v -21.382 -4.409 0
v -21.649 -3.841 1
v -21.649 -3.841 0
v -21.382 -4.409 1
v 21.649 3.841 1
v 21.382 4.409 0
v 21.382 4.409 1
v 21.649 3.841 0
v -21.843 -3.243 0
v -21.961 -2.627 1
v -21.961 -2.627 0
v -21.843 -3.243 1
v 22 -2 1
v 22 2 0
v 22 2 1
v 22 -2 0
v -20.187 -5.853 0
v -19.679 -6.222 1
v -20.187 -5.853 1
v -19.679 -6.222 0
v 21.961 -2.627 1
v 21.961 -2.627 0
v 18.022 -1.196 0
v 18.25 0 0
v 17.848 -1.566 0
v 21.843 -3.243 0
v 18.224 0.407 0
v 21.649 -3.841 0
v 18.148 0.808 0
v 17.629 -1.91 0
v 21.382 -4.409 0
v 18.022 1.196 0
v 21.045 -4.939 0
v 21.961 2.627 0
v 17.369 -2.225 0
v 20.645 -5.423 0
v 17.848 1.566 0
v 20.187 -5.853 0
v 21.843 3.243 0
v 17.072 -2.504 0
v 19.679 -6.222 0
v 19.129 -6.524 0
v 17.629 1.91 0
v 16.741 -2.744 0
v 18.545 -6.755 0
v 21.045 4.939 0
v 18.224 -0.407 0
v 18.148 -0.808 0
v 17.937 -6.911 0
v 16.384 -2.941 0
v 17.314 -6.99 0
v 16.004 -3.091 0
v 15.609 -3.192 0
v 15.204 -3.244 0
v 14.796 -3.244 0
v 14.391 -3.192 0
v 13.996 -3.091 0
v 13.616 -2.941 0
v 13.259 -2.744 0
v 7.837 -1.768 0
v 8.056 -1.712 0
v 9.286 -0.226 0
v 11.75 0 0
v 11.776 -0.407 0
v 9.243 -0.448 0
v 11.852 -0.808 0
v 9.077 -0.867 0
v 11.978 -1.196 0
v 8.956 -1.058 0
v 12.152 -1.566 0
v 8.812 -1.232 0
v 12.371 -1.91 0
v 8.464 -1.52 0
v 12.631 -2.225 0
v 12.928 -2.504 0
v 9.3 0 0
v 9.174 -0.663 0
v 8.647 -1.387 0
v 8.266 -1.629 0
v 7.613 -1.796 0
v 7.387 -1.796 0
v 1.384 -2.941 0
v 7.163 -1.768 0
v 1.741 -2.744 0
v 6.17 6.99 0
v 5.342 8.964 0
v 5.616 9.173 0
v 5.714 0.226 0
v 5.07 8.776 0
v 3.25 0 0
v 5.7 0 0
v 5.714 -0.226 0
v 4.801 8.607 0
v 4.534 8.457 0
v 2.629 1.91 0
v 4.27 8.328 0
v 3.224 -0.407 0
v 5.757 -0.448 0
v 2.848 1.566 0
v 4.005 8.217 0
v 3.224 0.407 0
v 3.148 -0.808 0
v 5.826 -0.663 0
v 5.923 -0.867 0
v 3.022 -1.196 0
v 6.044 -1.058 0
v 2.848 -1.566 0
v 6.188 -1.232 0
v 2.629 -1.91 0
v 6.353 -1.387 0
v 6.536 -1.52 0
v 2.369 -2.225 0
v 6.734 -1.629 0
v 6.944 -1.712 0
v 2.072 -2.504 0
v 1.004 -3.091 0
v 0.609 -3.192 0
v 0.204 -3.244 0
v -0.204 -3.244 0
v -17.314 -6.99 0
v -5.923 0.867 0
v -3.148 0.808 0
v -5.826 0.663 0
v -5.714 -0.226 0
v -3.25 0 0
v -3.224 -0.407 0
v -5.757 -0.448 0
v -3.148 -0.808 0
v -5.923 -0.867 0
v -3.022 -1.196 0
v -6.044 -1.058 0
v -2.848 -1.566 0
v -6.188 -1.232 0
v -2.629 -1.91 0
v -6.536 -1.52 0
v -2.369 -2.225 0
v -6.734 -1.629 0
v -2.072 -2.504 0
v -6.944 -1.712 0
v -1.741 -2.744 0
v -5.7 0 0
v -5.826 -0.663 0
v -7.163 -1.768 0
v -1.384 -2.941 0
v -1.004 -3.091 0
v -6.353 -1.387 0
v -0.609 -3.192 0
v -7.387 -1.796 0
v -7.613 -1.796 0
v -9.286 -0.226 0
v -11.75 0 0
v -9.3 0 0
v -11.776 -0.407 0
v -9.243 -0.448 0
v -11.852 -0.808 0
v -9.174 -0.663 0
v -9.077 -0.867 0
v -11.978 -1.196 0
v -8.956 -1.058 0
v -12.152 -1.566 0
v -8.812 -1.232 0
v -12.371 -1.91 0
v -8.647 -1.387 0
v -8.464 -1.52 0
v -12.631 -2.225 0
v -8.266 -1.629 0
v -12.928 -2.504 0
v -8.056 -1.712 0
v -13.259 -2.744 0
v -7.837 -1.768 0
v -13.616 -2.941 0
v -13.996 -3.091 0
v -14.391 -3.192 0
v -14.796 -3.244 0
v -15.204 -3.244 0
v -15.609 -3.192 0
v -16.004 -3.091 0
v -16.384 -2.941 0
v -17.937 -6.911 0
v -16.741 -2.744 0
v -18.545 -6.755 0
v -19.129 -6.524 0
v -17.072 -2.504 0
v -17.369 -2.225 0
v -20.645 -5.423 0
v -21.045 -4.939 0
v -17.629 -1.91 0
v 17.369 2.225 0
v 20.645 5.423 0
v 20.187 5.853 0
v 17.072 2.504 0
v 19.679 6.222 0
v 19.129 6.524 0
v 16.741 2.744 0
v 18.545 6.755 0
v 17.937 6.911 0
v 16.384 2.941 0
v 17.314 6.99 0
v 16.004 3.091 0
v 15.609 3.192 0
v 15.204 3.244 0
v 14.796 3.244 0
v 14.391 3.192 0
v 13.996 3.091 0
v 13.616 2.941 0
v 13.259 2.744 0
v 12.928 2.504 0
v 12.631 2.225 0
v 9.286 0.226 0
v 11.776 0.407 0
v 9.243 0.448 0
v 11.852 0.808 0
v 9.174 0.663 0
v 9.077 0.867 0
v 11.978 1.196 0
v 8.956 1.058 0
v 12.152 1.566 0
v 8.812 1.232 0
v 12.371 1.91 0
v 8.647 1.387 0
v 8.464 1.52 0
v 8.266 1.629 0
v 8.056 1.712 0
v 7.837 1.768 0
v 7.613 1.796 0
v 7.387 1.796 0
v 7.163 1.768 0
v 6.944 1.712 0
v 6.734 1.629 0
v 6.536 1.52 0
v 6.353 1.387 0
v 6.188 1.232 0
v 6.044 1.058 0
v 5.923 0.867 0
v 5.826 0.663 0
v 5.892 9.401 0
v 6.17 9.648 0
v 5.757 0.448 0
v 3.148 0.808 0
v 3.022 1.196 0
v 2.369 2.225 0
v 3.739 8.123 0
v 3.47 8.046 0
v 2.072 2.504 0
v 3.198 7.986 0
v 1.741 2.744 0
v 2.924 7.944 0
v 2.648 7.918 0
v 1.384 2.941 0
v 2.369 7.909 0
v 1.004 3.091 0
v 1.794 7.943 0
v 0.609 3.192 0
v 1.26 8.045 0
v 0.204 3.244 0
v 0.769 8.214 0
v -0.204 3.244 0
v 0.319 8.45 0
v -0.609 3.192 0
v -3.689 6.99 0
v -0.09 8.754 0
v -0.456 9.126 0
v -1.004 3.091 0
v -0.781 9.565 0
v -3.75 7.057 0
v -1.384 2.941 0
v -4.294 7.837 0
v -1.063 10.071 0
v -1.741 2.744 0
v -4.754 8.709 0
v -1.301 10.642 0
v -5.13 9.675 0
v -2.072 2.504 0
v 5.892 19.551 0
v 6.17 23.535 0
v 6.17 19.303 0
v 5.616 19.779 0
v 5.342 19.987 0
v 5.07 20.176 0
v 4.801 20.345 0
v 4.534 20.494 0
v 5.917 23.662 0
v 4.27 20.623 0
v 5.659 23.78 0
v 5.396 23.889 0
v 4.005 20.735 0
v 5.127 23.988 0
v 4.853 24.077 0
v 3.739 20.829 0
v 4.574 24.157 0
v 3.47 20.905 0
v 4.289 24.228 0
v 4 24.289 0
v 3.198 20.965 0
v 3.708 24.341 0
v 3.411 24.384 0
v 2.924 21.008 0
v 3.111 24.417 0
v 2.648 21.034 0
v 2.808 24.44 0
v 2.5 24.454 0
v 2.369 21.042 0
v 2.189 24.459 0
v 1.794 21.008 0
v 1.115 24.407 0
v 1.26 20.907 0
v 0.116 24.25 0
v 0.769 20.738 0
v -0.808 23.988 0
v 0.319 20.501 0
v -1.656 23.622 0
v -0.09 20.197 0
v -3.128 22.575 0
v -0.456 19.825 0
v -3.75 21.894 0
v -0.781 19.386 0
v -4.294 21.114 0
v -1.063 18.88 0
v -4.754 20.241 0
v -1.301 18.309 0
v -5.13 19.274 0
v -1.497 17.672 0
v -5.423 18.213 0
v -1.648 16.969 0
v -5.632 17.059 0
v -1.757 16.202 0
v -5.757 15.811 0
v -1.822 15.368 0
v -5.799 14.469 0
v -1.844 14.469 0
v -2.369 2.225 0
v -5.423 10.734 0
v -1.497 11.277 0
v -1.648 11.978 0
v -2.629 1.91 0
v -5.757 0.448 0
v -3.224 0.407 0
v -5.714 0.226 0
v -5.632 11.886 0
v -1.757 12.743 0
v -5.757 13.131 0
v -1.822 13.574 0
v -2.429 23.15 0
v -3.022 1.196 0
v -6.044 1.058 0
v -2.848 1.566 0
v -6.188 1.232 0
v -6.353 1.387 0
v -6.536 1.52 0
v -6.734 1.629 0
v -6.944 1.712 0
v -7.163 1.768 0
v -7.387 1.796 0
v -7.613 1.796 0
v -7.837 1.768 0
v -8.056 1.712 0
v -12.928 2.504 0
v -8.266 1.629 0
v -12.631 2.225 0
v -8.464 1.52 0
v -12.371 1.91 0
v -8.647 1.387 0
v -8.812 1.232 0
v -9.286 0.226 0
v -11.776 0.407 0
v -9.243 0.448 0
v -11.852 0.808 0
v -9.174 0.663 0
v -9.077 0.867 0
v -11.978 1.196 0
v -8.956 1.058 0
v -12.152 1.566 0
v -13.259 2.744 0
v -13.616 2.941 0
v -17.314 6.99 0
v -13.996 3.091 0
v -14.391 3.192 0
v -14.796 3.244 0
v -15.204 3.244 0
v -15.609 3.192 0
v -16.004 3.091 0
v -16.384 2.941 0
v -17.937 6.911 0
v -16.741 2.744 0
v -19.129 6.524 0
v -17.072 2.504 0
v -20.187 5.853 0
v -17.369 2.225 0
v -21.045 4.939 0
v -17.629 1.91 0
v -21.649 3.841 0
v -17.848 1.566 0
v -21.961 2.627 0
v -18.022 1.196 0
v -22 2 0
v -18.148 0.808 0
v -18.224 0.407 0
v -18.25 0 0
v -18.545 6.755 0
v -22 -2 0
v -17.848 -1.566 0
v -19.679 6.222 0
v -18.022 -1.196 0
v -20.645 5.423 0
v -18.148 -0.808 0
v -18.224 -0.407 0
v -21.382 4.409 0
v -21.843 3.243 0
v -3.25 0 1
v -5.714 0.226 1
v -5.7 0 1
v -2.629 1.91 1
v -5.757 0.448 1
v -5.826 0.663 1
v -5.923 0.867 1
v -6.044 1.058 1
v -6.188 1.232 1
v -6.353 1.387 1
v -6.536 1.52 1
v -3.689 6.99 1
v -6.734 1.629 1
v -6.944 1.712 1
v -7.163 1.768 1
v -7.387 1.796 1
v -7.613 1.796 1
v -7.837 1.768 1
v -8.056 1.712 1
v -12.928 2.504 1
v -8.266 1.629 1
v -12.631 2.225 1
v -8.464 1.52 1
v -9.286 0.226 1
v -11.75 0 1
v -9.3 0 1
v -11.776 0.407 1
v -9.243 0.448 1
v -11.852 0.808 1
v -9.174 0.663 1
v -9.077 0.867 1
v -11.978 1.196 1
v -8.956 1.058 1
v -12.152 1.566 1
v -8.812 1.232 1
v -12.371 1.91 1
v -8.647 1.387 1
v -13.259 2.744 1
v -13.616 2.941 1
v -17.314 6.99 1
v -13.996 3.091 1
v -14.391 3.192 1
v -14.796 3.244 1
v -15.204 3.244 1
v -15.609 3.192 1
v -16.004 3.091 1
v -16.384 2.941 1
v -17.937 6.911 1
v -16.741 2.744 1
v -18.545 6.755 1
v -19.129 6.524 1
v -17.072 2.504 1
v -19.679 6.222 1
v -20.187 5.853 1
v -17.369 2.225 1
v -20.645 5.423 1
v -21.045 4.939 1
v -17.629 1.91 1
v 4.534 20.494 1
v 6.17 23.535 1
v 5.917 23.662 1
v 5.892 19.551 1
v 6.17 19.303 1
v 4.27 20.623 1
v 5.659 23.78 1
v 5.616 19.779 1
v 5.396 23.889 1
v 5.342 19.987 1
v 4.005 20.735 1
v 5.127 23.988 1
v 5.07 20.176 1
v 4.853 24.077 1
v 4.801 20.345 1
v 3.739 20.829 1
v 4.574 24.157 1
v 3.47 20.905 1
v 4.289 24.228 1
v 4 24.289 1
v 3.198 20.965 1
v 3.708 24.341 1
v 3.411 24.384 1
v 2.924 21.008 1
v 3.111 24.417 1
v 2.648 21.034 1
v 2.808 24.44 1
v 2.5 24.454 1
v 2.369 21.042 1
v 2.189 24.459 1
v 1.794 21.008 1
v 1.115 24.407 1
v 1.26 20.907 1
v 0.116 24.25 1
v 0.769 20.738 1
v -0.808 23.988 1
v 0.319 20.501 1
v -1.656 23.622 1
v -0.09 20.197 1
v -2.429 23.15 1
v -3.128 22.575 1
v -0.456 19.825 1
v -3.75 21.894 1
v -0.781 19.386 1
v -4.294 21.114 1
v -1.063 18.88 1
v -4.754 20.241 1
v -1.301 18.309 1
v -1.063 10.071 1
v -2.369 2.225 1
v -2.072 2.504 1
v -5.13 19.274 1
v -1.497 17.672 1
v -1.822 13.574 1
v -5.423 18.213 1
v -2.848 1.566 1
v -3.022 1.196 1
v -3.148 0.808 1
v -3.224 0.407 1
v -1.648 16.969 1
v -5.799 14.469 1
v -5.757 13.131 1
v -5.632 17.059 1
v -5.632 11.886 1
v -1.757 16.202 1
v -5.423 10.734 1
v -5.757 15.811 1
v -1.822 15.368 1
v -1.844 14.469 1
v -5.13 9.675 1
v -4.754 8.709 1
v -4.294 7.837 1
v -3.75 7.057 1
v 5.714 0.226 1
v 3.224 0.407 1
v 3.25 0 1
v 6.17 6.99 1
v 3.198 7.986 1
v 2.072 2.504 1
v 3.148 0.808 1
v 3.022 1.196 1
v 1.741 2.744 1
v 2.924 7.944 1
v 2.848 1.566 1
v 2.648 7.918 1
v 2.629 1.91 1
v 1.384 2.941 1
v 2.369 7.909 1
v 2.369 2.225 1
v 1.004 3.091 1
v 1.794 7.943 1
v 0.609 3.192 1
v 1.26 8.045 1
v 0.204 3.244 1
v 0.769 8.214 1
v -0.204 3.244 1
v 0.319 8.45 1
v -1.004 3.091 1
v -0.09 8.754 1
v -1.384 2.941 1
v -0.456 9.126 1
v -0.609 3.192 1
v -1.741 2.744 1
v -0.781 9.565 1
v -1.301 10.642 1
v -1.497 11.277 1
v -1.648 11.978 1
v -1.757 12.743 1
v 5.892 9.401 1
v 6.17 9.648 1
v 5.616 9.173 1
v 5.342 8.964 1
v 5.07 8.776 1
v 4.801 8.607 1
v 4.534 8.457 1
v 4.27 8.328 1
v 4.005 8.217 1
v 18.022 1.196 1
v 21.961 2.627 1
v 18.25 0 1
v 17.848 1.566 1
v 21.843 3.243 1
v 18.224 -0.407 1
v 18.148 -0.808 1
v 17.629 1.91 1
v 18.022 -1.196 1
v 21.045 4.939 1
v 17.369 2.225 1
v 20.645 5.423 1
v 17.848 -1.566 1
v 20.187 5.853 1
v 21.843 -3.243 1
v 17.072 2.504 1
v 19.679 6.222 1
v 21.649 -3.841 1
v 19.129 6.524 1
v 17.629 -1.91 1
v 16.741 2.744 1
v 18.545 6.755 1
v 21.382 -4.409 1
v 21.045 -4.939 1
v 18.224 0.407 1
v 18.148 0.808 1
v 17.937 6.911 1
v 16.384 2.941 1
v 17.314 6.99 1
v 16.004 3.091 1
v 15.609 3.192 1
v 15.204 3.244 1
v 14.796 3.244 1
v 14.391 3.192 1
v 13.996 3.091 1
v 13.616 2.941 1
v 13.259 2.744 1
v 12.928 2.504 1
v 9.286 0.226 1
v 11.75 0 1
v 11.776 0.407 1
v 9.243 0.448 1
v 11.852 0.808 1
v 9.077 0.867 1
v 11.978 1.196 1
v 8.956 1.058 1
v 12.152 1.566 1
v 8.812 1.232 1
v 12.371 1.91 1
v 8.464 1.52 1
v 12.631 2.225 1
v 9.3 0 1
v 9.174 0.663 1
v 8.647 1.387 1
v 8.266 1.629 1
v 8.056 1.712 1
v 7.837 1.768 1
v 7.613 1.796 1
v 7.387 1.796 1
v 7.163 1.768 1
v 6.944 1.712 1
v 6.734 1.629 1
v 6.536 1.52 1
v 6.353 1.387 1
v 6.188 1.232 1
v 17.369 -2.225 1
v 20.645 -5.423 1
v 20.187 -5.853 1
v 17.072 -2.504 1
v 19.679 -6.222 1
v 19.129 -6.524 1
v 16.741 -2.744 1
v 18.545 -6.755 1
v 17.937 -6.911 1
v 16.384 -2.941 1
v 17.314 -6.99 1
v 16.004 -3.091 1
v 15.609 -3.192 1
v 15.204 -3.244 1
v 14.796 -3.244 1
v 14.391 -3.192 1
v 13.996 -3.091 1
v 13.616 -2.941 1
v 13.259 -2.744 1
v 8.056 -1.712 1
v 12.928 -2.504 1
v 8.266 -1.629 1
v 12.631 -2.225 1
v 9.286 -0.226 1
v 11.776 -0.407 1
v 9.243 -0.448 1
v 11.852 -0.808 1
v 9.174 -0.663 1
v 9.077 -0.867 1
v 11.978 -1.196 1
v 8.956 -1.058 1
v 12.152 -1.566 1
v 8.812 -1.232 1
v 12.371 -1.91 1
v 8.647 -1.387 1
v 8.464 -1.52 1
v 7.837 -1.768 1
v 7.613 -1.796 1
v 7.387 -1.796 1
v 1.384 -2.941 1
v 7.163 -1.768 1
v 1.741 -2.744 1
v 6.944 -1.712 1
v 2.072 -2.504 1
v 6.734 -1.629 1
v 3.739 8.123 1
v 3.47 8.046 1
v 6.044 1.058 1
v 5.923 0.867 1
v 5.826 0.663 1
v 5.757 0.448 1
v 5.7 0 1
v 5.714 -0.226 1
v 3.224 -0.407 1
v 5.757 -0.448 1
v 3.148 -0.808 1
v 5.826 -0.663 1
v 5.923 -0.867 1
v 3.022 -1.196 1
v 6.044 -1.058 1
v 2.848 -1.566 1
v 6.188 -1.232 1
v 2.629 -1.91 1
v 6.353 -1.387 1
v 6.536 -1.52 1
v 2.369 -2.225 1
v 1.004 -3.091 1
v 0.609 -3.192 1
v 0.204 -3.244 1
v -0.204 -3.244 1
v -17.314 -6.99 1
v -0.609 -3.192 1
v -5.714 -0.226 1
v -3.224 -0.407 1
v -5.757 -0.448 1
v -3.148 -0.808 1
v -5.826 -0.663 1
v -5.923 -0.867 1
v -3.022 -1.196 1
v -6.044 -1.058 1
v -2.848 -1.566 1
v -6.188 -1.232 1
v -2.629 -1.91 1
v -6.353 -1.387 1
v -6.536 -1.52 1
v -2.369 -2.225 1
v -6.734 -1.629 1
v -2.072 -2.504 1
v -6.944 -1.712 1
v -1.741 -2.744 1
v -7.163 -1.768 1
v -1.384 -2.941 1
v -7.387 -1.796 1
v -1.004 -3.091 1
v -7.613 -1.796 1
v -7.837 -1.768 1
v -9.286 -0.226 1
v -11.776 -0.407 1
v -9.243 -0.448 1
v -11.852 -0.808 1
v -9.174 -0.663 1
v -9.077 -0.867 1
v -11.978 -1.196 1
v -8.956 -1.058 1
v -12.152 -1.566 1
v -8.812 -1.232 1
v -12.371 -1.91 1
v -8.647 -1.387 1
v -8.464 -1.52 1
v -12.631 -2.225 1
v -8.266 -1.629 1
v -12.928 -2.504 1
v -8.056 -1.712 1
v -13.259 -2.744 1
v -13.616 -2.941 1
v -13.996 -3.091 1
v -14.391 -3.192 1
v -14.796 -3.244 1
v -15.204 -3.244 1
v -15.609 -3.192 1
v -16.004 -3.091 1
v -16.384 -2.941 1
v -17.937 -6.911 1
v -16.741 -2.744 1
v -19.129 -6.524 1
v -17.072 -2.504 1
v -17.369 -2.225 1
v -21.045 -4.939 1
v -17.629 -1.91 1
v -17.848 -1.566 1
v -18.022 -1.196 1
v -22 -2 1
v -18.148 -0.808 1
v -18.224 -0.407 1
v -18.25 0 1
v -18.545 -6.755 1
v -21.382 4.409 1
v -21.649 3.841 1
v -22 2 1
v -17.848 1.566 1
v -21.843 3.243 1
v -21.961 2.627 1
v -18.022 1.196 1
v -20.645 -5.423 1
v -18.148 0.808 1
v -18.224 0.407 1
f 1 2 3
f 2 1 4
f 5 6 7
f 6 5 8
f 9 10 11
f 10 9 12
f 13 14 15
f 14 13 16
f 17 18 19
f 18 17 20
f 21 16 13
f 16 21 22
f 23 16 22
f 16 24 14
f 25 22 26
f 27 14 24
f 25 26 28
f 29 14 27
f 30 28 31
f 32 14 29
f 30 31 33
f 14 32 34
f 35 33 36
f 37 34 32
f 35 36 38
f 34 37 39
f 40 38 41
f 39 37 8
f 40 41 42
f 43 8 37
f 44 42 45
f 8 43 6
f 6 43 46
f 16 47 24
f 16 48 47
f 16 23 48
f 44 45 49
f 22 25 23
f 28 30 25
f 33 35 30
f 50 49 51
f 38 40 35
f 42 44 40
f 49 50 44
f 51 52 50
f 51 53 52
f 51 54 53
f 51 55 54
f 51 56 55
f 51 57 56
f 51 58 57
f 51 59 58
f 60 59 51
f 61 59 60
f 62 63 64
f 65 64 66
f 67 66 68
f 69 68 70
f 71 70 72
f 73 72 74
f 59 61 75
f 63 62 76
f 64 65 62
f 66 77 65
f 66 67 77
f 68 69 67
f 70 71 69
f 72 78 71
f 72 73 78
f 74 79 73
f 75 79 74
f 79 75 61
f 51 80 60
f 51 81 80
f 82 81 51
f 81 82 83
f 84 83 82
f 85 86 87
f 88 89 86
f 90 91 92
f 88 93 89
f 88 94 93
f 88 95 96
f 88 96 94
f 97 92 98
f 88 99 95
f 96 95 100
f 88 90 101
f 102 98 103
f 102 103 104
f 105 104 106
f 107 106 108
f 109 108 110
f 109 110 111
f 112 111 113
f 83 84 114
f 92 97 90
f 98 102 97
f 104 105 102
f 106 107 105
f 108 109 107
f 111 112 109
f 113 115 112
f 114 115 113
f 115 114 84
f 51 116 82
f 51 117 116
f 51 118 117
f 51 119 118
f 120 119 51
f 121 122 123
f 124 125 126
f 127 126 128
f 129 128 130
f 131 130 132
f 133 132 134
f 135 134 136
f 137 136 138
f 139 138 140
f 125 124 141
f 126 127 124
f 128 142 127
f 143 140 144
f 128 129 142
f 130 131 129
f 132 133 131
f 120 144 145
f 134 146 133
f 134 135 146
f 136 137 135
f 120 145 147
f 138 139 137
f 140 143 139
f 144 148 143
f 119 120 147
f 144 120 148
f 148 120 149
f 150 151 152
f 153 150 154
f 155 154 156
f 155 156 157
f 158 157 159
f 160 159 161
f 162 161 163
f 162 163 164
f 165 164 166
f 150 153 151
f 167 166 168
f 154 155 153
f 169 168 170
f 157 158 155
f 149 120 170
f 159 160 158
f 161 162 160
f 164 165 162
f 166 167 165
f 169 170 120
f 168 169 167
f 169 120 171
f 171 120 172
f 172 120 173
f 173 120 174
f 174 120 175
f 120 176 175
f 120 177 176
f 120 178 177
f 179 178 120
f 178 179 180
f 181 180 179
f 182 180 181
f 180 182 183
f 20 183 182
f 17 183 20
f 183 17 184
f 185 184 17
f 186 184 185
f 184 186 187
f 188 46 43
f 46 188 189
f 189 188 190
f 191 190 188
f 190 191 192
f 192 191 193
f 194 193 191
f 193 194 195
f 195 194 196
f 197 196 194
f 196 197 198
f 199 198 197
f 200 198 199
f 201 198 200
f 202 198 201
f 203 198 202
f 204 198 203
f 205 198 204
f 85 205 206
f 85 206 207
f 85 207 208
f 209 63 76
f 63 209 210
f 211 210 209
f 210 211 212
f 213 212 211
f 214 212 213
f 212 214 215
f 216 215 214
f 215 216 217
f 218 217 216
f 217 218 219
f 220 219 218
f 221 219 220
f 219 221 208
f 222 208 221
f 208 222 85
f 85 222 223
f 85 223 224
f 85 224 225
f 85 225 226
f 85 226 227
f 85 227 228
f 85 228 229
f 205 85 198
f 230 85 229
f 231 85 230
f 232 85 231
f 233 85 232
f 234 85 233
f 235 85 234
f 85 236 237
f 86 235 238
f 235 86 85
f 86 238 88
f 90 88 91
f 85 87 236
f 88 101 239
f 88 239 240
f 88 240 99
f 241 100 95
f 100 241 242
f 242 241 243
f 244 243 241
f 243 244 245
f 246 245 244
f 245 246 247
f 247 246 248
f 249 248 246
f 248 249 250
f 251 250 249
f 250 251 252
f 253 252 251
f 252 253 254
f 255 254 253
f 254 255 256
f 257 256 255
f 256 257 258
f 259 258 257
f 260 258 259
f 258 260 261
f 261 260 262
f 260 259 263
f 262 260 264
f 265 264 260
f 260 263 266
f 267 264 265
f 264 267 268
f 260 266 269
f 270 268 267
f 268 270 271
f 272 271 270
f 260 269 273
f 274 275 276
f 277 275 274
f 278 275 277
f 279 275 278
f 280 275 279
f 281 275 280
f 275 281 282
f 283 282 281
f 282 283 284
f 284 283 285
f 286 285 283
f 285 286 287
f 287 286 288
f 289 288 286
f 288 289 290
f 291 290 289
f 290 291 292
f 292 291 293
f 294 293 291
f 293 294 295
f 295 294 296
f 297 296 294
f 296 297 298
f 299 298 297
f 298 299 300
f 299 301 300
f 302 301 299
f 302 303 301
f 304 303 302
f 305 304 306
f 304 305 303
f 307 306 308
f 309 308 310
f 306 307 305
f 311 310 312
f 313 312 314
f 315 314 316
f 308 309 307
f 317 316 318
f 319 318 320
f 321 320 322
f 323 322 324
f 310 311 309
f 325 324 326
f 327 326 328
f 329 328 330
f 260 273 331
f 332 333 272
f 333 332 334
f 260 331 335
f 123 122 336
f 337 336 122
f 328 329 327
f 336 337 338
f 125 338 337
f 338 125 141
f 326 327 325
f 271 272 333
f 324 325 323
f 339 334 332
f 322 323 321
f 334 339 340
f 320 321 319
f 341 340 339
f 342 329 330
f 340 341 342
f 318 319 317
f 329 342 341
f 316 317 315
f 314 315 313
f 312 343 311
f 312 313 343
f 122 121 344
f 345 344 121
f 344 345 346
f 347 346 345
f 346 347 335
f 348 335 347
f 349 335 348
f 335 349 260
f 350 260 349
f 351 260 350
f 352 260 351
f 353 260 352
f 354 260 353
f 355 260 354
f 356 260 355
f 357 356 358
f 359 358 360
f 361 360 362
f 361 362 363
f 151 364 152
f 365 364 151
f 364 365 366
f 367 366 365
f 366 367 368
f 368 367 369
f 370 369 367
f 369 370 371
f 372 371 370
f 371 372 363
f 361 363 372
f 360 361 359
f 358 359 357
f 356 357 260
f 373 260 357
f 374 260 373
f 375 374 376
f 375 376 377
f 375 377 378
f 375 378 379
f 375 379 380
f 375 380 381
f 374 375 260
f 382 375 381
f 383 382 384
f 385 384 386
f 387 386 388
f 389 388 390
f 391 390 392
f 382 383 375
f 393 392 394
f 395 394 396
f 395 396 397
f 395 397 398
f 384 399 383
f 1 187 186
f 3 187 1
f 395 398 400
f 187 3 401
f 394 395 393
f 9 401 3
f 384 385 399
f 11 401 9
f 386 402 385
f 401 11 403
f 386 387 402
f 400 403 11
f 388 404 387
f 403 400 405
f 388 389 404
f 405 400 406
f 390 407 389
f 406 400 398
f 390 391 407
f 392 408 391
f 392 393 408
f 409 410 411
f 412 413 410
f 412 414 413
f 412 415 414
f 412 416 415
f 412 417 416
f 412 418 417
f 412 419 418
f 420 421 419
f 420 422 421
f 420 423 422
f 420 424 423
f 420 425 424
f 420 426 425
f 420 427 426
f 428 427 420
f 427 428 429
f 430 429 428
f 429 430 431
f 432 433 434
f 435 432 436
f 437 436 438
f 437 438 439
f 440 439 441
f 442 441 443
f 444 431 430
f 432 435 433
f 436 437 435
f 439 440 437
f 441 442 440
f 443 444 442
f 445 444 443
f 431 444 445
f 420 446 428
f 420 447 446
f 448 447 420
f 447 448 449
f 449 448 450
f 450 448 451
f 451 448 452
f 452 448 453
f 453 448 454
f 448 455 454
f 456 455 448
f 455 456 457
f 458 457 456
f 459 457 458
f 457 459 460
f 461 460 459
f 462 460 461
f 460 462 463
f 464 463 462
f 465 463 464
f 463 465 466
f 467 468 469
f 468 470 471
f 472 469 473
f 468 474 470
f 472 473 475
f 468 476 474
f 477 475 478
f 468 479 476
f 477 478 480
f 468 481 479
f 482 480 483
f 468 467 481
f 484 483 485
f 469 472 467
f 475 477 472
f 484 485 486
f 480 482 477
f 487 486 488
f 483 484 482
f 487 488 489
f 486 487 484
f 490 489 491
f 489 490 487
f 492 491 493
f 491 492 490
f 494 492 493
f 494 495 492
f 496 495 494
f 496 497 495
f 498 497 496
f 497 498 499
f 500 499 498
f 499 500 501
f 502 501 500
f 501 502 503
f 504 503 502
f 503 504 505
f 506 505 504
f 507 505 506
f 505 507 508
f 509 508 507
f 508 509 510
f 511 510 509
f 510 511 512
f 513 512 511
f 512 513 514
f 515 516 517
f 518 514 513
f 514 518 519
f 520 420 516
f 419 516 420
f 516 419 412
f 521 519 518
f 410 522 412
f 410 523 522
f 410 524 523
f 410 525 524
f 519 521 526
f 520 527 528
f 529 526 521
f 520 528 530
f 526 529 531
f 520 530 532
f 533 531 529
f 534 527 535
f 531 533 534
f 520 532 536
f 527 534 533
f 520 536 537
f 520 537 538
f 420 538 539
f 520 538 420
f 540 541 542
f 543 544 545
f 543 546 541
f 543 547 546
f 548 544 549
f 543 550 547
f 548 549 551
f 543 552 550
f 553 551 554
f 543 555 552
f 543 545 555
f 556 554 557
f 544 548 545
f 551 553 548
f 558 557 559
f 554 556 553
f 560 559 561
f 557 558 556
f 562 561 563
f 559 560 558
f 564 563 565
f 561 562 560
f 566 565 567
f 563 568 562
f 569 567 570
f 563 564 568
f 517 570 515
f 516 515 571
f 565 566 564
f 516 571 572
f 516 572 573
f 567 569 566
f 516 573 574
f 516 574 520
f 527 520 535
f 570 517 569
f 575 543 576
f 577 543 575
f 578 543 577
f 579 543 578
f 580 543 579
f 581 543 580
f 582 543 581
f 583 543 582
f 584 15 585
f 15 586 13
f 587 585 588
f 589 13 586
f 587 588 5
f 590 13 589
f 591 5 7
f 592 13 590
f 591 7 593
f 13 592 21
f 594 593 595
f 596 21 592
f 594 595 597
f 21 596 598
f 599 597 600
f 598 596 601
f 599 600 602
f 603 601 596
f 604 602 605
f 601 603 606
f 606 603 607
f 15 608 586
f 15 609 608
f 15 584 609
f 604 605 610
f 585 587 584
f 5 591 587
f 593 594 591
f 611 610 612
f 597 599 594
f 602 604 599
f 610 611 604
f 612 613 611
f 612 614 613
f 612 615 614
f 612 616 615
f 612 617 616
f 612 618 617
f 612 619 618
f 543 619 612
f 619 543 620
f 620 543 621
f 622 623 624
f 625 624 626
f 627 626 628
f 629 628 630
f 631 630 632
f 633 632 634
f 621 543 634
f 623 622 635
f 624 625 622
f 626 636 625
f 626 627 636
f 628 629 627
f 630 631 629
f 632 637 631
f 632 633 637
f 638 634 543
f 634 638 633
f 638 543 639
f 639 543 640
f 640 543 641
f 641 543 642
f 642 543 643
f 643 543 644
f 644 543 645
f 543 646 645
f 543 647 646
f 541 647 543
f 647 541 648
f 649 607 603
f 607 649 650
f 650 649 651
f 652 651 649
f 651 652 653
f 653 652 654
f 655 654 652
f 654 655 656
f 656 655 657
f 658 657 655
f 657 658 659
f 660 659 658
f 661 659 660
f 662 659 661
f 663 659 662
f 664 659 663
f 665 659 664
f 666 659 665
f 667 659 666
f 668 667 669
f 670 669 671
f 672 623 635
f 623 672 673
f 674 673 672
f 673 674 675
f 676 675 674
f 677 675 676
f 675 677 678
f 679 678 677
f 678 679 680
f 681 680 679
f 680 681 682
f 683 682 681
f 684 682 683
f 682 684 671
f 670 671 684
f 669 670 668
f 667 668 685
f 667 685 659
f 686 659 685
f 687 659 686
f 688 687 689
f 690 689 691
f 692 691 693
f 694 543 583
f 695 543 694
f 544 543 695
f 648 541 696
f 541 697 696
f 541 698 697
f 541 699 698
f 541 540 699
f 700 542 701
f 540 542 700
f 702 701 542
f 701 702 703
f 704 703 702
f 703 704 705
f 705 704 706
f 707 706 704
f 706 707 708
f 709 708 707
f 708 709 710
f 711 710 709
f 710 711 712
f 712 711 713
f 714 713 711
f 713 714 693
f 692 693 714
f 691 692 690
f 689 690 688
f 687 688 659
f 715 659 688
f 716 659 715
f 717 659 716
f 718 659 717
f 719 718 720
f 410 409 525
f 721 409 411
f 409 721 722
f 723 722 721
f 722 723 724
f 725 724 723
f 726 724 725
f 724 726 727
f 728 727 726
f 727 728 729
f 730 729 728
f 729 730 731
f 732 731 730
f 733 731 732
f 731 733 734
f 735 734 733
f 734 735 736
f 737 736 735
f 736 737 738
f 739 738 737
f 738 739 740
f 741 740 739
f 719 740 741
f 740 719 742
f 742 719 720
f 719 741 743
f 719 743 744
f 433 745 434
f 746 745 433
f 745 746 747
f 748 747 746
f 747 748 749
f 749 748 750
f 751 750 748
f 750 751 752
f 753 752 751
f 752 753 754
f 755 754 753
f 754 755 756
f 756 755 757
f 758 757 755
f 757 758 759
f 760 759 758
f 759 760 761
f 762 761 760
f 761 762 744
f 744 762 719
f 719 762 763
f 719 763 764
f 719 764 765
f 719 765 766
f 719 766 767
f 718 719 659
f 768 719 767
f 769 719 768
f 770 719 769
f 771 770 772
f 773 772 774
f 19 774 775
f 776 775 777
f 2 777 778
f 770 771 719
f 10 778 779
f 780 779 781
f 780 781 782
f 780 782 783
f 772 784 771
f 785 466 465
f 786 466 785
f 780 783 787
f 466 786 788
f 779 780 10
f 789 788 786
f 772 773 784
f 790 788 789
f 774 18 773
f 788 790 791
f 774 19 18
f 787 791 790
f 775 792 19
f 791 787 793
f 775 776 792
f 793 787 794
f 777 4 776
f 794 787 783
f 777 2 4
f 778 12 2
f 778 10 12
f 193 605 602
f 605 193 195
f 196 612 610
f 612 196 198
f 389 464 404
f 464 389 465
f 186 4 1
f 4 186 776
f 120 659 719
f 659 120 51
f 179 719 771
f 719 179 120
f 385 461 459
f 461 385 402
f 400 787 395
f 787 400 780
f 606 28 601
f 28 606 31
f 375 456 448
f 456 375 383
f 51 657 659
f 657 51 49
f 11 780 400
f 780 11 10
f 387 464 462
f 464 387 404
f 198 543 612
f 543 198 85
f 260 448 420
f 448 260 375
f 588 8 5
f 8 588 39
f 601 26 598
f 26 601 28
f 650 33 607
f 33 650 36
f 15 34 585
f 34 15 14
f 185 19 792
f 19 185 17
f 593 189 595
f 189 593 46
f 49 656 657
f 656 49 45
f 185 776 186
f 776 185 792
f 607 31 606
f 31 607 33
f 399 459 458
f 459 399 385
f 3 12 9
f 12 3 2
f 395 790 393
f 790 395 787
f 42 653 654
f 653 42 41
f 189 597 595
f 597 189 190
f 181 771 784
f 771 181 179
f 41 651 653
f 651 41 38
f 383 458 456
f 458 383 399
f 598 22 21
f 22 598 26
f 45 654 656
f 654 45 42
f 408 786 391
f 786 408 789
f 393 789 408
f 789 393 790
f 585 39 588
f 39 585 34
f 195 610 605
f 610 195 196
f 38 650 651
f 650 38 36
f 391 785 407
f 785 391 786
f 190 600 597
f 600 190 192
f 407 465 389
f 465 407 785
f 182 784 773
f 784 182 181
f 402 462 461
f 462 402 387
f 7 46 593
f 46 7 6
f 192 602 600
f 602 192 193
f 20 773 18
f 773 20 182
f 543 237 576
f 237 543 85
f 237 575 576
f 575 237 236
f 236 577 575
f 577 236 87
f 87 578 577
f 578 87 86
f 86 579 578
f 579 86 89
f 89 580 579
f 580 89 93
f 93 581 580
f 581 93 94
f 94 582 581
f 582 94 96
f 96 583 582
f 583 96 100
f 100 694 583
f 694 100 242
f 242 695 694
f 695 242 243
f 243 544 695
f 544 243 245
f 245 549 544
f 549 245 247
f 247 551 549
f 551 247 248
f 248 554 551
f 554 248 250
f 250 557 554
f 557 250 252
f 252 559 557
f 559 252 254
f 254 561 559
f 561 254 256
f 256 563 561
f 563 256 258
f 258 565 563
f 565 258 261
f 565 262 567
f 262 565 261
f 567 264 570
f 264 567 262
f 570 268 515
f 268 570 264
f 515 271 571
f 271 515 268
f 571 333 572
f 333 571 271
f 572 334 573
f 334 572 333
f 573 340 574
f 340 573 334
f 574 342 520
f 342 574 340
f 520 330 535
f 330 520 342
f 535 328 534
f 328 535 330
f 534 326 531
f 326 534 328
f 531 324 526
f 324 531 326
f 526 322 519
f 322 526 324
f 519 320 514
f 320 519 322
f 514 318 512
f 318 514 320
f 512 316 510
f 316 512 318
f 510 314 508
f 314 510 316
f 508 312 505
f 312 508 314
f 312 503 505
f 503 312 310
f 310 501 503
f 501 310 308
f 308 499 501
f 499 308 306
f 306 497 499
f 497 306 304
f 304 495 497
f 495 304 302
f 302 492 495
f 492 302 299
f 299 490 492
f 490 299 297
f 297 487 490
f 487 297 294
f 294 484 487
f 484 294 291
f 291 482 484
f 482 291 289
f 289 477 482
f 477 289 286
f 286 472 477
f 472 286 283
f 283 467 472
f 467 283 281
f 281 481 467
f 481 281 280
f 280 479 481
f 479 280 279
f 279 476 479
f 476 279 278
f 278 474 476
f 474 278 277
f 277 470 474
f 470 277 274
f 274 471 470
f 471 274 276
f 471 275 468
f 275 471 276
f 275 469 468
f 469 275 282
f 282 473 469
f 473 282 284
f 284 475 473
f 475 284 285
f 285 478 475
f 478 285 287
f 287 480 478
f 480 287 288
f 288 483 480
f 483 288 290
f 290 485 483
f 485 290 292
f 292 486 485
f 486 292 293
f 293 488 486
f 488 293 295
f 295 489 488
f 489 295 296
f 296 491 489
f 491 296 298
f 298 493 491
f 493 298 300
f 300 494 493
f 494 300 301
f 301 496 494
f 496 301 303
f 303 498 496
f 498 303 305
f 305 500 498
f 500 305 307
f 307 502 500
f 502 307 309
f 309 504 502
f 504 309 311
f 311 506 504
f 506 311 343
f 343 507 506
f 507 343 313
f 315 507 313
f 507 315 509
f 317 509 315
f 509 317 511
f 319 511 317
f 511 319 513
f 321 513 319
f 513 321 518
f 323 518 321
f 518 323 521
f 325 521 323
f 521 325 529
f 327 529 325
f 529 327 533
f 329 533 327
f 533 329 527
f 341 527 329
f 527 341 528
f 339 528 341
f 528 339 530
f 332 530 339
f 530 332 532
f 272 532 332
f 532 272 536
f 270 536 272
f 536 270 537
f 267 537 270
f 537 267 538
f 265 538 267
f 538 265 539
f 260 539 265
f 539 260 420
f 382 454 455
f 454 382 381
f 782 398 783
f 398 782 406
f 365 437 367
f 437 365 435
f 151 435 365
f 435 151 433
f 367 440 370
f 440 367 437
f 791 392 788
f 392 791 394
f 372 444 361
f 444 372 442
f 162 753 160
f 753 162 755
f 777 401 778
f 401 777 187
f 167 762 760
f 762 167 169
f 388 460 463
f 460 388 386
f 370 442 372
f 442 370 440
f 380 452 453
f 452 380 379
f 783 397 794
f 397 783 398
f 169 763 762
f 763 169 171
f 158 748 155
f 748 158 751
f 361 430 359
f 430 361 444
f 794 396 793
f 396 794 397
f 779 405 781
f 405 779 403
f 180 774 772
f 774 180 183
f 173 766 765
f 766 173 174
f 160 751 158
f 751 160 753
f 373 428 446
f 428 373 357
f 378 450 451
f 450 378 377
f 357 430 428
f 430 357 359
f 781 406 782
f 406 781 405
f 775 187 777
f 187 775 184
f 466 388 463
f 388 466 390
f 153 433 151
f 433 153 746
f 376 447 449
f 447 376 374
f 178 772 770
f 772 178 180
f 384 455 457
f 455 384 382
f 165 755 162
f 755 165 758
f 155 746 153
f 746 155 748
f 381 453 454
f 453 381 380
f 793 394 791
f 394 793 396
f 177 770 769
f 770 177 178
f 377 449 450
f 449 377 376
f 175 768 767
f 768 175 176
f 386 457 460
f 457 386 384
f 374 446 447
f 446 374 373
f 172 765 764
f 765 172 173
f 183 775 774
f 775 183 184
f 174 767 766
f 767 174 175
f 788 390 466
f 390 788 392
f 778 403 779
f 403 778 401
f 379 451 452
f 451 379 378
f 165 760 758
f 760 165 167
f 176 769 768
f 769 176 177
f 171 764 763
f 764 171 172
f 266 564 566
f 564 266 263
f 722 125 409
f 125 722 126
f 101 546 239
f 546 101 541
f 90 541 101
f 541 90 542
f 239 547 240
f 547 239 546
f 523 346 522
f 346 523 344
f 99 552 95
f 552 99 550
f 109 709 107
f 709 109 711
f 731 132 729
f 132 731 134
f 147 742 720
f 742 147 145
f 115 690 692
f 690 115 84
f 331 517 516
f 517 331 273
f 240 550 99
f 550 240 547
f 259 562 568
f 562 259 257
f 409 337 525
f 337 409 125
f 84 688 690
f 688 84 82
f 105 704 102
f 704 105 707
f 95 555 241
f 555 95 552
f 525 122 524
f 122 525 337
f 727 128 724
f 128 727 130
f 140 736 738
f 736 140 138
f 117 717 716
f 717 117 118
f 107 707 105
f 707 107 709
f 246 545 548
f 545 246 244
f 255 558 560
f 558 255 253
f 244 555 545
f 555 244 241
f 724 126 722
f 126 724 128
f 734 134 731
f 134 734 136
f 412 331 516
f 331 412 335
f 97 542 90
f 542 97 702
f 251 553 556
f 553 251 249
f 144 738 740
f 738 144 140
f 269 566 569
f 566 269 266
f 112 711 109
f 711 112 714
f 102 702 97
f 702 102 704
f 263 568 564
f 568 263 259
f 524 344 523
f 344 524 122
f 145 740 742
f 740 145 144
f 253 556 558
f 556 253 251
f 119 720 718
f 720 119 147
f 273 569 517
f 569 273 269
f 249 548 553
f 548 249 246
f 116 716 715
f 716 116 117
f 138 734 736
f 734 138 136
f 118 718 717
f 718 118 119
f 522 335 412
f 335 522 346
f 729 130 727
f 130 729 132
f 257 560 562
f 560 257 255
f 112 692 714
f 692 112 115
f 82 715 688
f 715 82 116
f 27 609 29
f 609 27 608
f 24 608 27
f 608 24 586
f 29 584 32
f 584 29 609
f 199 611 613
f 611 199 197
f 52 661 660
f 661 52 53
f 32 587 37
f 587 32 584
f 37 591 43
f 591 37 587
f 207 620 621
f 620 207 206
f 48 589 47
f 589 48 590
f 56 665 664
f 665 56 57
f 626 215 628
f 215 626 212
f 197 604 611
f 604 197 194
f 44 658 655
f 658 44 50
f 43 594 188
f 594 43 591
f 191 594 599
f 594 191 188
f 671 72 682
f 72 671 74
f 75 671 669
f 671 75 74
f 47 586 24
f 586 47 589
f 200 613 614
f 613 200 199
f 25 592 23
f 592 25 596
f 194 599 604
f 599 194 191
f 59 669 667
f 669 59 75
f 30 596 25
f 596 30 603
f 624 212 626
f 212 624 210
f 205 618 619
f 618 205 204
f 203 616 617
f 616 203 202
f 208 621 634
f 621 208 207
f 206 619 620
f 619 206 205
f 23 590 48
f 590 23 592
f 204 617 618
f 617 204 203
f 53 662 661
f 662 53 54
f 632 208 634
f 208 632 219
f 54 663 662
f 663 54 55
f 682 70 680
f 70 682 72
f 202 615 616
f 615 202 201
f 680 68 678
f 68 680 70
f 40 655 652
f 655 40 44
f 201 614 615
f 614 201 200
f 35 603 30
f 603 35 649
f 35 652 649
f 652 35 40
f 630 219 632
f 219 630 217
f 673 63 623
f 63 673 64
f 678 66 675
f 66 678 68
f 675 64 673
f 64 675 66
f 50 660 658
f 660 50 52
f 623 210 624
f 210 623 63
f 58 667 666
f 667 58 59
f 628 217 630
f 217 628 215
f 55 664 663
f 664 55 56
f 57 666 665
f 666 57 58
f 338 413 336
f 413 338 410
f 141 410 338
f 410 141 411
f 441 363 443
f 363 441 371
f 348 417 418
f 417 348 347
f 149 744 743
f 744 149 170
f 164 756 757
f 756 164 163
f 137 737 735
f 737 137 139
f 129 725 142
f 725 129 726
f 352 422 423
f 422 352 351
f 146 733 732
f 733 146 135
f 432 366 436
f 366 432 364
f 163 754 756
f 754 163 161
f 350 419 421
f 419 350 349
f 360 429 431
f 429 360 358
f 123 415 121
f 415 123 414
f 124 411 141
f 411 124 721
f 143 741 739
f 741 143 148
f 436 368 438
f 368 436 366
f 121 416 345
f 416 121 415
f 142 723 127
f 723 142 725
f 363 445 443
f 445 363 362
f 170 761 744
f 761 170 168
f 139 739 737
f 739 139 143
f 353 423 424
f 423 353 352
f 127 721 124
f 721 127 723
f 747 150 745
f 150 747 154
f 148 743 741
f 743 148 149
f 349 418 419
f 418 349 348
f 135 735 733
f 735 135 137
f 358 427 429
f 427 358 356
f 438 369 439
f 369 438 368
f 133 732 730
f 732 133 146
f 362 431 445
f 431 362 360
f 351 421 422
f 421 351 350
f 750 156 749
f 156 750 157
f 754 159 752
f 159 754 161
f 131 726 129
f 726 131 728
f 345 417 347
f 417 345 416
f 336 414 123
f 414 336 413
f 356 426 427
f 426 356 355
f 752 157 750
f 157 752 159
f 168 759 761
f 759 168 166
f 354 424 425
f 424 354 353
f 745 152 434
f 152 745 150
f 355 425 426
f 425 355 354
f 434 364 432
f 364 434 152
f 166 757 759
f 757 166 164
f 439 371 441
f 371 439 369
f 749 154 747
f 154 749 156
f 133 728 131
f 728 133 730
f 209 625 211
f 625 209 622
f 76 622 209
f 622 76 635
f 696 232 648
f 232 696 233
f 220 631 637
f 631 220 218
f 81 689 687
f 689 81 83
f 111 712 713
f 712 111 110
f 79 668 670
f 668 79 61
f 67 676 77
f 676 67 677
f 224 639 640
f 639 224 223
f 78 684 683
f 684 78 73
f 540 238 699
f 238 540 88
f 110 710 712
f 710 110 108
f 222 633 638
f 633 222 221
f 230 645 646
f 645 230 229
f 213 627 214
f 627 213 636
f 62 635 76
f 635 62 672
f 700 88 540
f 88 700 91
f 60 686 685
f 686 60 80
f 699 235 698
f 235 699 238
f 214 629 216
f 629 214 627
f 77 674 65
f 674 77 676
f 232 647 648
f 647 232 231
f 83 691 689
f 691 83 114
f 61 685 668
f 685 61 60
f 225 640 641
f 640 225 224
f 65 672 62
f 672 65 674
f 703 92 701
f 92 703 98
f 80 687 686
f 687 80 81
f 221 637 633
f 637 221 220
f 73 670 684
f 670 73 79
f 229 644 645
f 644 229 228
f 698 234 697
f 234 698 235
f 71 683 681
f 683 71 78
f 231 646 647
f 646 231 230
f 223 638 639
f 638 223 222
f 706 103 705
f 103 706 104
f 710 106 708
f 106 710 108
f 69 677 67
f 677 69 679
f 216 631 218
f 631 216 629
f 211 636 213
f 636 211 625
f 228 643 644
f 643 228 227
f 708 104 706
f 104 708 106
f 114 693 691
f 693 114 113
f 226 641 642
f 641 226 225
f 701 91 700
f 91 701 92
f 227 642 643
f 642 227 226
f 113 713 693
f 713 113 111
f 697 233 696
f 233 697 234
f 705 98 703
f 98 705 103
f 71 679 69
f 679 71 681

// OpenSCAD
$fn = 50;


difference() {
	union() {
		hull() {
			translate(v = [-17.0000000000, 2.0000000000, 0]) {
				cylinder(h = 1, r = 5);
			}
			translate(v = [17.0000000000, 2.0000000000, 0]) {
				cylinder(h = 1, r = 5);
			}
			translate(v = [-17.0000000000, -2.0000000000, 0]) {
				cylinder(h = 1, r = 5);
			}
			translate(v = [17.0000000000, -2.0000000000, 0]) {
				cylinder(h = 1, r = 5);
			}
		}
		translate(v = [0, 24, 0]) {
			linear_extrude(height = 1) {
				text(font = "DejaVu Sans Mono:style=Bold", halign = "center", size = 19.0000000000, text = "C", valign = "top");
			}
		}
	}
	union() {
		translate(v = [-15.0000000000, 0.0000000000, 0]) {
			translate(v = [0, 0, -100]) {
				cylinder(h = 200, r = 3.2500000000);
			}
		}
		translate(v = [0, 0, -100]) {
			cylinder(h = 200, r = 3.2500000000);
		}
		translate(v = [15.0000000000, 0.0000000000, 0]) {
			translate(v = [0, 0, -100]) {
				cylinder(h = 200, r = 3.2500000000);
			}
		}
		translate(v = [-15.0000000000, 0.0000000000, 0]) {
			translate(v = [0, 0, -100]) {
				cylinder(h = 200, r = 1.8000000000);
			}
		}
		translate(v = [-7.5000000000, 0.0000000000, 0]) {
			translate(v = [0, 0, -100]) {
				cylinder(h = 200, r = 1.8000000000);
			}
		}
		translate(v = [0, 0, -100]) {
			cylinder(h = 200, r = 1.8000000000);
		}
		translate(v = [7.5000000000, 0.0000000000, 0]) {
			translate(v = [0, 0, -100]) {
				cylinder(h = 200, r = 1.8000000000);
			}
		}
		translate(v = [15.0000000000, 0.0000000000, 0]) {
			translate(v = [0, 0, -100]) {
				cylinder(h = 200, r = 1.8000000000);
			}
		}
	}
}
